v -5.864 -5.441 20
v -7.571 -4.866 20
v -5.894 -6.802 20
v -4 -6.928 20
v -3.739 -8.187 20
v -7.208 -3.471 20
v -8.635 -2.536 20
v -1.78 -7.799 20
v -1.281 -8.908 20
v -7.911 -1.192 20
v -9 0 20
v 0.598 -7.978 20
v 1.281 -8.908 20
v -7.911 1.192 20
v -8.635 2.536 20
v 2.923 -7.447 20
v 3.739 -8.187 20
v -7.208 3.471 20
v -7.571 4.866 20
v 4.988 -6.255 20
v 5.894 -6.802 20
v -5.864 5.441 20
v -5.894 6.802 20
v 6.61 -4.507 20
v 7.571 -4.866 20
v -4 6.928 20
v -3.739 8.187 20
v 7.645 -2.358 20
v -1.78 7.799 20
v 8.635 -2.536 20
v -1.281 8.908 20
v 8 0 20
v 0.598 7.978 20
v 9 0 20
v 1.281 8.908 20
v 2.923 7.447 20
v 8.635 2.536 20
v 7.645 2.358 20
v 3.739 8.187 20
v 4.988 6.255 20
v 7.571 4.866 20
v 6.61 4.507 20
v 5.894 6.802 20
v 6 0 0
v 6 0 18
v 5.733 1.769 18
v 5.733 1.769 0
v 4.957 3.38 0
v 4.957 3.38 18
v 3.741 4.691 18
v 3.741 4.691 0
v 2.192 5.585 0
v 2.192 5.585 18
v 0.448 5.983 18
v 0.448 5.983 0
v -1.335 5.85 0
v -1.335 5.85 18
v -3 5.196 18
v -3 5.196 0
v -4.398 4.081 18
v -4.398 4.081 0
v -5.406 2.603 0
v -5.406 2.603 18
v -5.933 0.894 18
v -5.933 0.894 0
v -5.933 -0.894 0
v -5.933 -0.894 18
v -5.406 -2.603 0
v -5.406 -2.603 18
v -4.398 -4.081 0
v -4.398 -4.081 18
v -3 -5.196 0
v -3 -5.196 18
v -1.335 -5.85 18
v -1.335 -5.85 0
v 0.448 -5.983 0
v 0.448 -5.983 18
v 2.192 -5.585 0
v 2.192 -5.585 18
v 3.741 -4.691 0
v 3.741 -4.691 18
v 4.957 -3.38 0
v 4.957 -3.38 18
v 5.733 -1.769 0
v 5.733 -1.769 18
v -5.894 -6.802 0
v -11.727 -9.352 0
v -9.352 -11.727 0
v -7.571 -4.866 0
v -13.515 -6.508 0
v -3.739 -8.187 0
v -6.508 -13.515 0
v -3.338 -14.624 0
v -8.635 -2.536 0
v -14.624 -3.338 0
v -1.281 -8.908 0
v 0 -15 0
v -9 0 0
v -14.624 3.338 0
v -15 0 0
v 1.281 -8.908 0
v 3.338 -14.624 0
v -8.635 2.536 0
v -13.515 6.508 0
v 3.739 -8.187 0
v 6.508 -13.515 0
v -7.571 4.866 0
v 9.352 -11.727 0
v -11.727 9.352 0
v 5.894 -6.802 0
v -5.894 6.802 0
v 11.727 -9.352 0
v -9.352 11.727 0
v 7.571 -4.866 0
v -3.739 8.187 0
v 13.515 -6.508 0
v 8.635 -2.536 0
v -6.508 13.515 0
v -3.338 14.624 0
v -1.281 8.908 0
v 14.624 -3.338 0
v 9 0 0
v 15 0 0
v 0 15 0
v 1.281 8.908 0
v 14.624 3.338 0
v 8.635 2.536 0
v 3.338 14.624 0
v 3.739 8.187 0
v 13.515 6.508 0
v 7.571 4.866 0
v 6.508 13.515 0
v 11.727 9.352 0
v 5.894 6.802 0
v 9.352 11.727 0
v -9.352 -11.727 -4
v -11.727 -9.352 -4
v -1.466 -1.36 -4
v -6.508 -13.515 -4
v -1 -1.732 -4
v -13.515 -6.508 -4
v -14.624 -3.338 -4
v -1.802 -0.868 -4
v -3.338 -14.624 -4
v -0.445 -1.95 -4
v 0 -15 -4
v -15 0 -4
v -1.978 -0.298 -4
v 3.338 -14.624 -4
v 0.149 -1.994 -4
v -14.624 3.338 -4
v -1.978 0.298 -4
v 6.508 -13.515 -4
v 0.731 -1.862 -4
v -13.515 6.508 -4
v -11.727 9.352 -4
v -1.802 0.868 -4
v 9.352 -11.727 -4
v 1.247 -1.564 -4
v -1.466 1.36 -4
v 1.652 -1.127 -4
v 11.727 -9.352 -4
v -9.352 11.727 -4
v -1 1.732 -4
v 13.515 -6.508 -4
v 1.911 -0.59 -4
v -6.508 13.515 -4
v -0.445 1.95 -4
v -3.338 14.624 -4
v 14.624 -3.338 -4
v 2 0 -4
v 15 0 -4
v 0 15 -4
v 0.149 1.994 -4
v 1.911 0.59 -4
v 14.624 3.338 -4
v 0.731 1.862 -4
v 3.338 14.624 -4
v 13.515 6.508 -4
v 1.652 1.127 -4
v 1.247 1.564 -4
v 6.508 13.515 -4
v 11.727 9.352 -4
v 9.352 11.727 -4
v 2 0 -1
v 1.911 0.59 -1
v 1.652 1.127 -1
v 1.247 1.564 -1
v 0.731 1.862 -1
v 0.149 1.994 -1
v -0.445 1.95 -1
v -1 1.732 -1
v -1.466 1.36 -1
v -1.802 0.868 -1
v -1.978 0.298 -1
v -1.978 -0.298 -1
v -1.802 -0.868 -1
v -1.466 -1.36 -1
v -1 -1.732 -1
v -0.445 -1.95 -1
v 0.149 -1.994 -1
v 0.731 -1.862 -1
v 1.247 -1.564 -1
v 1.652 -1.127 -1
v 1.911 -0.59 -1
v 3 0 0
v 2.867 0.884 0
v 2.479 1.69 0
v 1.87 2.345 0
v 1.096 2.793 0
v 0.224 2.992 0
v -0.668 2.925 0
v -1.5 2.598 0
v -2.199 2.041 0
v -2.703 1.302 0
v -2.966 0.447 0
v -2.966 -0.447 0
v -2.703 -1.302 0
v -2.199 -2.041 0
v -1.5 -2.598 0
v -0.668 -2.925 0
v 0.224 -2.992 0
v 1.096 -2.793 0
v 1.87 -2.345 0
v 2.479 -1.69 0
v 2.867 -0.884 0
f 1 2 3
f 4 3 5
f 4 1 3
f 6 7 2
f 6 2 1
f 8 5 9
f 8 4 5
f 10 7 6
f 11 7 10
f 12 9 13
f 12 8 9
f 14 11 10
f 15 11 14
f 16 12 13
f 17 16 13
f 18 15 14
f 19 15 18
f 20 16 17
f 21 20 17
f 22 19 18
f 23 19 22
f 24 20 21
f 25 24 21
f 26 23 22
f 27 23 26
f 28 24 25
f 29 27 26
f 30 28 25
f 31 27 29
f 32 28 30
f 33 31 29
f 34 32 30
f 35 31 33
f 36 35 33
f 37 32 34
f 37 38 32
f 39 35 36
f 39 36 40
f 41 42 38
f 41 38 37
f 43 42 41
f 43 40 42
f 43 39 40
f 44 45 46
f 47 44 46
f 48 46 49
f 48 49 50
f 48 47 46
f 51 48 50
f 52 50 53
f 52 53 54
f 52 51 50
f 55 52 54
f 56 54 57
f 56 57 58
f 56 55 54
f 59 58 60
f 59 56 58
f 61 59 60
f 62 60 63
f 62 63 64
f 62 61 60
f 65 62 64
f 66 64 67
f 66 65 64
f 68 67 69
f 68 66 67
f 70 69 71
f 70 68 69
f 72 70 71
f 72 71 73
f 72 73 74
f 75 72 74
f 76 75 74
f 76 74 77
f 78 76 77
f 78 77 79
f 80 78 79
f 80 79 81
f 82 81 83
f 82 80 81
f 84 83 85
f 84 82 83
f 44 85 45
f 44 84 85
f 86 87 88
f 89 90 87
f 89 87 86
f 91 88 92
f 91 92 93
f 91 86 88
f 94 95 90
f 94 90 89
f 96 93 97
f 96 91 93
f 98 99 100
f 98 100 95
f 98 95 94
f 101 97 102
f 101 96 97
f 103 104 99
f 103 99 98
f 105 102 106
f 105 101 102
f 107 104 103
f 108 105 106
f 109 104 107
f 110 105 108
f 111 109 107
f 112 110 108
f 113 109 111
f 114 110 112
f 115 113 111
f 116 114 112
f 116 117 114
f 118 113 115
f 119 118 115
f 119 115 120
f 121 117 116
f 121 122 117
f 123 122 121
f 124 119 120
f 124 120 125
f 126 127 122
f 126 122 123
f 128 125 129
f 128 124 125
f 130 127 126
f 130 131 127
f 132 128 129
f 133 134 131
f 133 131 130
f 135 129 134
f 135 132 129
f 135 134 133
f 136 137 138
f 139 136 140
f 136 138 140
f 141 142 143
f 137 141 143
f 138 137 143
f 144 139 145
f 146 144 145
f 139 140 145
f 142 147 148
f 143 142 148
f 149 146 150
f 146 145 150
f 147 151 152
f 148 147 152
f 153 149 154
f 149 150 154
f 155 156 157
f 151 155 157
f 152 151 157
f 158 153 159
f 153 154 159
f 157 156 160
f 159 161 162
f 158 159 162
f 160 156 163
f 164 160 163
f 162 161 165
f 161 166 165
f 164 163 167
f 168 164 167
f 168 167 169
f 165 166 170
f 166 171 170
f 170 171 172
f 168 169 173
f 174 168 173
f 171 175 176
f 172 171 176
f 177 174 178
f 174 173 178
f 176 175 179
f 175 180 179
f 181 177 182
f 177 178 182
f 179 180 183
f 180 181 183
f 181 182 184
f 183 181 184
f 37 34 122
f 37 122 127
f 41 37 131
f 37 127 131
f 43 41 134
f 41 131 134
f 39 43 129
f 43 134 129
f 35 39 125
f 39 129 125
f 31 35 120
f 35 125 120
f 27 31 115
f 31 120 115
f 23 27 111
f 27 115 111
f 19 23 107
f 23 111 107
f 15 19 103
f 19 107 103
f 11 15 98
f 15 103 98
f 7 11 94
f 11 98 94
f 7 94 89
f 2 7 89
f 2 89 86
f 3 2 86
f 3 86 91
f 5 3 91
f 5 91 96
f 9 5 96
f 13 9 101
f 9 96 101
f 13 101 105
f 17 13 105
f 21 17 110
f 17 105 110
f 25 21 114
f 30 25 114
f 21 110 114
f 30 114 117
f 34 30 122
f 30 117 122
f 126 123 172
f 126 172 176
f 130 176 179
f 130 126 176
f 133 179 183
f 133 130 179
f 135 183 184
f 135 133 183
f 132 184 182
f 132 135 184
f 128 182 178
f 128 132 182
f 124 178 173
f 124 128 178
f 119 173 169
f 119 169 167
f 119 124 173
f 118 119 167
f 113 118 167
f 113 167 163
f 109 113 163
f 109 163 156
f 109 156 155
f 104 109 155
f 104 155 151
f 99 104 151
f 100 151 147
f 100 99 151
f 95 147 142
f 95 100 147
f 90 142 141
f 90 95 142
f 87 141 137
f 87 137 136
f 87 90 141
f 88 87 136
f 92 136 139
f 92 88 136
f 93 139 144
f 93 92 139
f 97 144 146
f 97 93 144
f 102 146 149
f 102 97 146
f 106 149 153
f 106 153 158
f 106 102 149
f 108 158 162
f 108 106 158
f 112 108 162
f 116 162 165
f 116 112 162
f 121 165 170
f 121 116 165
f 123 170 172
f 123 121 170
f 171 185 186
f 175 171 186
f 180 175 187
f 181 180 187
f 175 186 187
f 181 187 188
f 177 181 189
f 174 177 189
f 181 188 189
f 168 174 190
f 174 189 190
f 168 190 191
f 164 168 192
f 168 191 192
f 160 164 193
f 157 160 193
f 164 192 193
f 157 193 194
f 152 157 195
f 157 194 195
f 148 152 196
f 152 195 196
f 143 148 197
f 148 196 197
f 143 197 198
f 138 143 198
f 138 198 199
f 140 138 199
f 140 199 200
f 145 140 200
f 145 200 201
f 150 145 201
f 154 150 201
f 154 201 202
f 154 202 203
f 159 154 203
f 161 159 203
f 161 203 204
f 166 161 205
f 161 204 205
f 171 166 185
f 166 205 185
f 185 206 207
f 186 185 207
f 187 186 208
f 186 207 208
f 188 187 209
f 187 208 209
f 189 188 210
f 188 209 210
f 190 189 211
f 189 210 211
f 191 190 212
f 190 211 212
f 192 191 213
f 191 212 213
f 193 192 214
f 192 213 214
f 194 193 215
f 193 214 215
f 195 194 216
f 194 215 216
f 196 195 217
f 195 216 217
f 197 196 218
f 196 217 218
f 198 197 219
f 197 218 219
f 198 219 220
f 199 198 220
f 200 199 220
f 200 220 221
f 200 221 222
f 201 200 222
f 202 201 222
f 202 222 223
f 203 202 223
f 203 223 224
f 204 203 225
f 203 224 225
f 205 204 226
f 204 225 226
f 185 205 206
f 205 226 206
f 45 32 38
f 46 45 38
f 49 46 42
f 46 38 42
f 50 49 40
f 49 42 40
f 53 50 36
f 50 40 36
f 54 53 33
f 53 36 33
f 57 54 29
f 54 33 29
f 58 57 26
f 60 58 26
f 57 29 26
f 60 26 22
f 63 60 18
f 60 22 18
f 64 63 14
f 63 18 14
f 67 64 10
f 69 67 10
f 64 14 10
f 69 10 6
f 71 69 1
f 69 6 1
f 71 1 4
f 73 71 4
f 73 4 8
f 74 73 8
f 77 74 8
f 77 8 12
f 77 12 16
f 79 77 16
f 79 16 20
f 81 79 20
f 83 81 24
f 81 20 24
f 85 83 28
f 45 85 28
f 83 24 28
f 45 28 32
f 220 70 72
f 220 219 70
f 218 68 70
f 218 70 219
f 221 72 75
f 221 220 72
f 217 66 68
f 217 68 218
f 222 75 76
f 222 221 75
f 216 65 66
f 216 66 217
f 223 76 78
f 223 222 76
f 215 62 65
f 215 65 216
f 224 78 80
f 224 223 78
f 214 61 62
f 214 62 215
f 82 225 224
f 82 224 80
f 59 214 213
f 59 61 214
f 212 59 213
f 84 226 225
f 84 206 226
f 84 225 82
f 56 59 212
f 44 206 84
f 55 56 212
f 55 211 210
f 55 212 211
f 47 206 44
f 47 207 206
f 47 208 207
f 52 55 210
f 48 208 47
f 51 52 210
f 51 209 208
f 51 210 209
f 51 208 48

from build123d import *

# Parameters (mm, degrees)
F0_R     = 15
F0_R_2   = 9
F0_R_3   = 6
F0_R_4   = 2
F1_DEPTH = 4
F2_DEPTH = 20
F3_SIZE  = 1
F4_SIZE  = 2


with BuildPart() as f1:
    # F0 (on Top) → F1 (new body)
    with BuildSketch(Plane.XY):
        Circle(F0_R)
        Circle(F0_R_2, mode=Mode.SUBTRACT)
        Circle(F0_R_2)
        Circle(F0_R_3, mode=Mode.SUBTRACT)
        Circle(F0_R_3)
        Circle(F0_R_4, mode=Mode.SUBTRACT)
    extrude(amount=-F1_DEPTH)

    # F0 (on Top) → F2 (join)
    with BuildSketch(Plane.XY):
        Circle(F0_R_2)
        Circle(F0_R_3, mode=Mode.SUBTRACT)
    extrude(amount=F2_DEPTH)

    # F3
    f3_edges = [f1.edges().sort_by_distance(p)[0] for p in [
        (-2, 0, 0),
    ]]
    chamfer(f3_edges, length=F3_SIZE)

    # F4
    f4_edges = [f1.edges().sort_by_distance(p)[0] for p in [
        (-6, 0, 20),
    ]]
    chamfer(f4_edges, length=F4_SIZE)


solid = f1.part
